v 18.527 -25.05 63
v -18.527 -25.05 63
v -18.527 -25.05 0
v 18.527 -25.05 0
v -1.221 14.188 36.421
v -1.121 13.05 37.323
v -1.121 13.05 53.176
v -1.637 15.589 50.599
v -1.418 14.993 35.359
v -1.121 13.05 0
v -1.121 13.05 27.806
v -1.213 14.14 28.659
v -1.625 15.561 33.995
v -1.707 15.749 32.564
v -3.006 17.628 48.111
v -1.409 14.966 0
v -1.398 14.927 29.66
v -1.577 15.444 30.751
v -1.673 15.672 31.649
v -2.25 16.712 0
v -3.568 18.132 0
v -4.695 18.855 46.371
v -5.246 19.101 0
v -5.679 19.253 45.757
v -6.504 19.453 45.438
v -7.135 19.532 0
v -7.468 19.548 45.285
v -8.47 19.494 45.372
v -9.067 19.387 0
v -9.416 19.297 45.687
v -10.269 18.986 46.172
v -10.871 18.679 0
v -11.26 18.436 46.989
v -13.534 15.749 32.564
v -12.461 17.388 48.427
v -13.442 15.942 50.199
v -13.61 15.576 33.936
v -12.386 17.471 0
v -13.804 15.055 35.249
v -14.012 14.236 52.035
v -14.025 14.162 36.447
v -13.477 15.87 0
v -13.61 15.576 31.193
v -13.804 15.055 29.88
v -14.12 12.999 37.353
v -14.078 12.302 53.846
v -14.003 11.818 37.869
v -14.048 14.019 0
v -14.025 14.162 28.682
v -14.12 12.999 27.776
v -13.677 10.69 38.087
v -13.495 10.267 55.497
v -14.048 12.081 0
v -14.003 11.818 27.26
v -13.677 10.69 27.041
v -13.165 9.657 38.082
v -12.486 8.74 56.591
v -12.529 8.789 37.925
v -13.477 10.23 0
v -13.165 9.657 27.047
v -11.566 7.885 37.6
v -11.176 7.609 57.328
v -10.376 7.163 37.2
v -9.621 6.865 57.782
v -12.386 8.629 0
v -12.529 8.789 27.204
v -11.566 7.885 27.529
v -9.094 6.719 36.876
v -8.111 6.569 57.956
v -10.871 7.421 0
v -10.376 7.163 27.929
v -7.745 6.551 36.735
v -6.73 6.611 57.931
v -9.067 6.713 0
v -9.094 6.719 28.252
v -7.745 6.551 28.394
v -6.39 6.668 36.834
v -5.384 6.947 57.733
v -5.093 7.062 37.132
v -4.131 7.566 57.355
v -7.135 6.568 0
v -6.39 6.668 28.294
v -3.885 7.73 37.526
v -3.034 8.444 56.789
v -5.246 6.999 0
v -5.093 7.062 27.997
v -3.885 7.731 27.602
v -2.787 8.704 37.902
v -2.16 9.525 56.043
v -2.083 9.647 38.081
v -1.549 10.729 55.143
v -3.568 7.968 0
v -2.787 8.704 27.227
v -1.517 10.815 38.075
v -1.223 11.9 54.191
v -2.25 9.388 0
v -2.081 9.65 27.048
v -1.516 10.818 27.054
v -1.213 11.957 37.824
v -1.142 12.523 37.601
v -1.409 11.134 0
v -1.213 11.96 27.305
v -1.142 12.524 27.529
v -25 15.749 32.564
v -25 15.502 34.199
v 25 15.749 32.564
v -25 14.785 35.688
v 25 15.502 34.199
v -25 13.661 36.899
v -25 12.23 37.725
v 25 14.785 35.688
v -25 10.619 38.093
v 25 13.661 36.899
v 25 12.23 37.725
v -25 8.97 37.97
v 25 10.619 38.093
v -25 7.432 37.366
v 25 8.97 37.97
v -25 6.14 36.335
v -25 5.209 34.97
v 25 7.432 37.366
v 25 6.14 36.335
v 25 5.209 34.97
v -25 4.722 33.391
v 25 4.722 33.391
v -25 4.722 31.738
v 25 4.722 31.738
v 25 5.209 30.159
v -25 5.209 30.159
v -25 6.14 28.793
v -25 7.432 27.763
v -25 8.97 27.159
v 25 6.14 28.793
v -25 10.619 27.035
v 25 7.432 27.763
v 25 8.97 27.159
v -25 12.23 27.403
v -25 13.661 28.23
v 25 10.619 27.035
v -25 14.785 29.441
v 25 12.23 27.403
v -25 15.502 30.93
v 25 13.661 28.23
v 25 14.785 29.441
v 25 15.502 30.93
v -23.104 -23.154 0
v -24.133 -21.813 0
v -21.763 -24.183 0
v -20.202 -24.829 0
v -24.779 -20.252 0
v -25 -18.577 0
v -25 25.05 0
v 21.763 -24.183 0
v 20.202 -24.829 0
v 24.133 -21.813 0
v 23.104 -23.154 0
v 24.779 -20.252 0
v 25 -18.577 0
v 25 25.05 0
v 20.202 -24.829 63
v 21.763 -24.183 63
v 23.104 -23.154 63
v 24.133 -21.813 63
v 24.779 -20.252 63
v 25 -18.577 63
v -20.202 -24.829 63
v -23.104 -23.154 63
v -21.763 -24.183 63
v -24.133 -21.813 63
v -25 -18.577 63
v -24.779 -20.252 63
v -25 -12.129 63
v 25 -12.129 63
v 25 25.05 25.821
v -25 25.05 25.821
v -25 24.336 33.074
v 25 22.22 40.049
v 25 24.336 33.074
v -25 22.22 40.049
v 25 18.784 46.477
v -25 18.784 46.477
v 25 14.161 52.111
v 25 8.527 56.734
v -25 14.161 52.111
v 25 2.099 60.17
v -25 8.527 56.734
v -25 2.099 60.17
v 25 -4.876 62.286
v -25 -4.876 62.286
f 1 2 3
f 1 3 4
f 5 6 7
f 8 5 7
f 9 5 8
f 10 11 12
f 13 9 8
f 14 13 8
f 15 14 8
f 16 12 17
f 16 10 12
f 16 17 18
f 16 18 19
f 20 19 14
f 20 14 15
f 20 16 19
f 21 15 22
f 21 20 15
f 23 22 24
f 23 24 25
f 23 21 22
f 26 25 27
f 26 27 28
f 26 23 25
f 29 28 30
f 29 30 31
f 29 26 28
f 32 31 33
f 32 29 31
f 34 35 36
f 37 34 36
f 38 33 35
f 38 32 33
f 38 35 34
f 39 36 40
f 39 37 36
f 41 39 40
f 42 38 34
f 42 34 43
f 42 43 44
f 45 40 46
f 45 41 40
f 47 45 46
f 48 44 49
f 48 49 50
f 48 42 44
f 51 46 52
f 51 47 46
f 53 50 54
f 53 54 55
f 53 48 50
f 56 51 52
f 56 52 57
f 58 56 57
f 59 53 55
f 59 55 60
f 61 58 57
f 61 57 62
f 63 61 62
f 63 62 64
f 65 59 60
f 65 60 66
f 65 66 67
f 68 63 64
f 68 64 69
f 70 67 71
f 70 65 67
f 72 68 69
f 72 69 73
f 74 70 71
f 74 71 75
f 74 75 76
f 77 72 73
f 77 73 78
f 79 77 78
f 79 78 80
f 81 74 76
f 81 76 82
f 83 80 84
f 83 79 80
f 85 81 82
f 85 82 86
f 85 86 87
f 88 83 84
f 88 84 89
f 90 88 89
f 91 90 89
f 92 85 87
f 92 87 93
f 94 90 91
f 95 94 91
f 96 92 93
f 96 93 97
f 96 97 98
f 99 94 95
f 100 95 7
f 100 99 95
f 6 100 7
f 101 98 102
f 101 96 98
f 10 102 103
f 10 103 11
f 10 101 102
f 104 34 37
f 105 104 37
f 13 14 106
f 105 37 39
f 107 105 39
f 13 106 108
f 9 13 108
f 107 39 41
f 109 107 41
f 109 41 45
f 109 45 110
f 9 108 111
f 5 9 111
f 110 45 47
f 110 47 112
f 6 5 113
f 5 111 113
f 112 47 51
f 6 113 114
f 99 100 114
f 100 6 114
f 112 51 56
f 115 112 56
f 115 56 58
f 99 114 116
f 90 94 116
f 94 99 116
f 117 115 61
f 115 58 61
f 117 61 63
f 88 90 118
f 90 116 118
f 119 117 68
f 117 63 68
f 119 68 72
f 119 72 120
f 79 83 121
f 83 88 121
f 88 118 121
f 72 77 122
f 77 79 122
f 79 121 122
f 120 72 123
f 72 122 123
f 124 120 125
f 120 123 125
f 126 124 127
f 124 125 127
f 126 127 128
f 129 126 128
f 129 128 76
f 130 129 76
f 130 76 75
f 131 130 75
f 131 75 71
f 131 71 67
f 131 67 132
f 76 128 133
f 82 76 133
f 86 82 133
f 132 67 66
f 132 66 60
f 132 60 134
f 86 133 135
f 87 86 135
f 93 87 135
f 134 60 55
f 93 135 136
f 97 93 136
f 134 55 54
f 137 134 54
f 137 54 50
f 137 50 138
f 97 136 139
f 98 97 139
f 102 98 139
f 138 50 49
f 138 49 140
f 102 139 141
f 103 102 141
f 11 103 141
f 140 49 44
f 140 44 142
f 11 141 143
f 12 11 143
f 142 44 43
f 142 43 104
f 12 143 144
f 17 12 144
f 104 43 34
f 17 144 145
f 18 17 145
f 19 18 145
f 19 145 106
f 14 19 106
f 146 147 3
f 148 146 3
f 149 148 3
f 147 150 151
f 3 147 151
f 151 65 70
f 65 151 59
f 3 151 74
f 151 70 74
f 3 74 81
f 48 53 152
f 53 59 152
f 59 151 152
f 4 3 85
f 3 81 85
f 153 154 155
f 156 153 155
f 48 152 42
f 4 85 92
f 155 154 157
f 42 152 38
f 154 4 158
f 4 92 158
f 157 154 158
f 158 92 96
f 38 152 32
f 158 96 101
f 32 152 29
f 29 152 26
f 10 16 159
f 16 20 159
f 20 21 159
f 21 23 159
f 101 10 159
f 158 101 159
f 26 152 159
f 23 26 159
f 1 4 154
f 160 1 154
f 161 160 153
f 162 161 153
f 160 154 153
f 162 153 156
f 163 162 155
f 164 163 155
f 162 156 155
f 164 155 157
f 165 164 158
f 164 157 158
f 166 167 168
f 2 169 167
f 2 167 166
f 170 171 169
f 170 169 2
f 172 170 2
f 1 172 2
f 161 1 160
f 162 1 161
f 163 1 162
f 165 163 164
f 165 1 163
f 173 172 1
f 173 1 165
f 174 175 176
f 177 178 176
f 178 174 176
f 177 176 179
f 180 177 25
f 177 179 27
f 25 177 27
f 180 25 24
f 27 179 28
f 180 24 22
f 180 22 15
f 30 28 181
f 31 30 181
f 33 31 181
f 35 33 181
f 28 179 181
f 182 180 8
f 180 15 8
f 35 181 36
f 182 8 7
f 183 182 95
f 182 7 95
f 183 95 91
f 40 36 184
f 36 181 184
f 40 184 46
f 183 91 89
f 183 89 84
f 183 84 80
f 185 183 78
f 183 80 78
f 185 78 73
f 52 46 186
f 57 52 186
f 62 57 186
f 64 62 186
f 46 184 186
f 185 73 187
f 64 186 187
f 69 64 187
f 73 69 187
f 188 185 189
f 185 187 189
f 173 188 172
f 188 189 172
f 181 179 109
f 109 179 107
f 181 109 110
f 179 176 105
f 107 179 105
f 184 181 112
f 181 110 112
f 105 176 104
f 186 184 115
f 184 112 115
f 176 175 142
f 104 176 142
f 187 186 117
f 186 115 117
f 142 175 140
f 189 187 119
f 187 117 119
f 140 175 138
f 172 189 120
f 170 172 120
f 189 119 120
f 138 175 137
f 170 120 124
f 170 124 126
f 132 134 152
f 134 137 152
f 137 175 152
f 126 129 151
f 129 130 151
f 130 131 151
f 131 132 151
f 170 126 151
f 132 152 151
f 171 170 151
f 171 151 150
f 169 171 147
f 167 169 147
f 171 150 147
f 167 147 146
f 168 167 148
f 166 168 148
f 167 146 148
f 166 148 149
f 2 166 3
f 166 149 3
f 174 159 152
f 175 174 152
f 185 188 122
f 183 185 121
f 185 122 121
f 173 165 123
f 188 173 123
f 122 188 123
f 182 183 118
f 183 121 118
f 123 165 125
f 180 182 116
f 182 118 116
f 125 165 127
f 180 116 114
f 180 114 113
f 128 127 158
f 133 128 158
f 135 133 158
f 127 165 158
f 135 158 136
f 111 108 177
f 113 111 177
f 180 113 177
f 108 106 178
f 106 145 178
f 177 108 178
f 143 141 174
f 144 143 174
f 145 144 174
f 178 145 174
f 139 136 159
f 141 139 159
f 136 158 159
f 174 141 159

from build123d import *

# Parameters (mm, degrees)
F0_R        = 6.5
F1_DEPTH    = 63
F2_T1_DEPTH = 235.8944443027
F3_R        = 5.5443537003
F4_DEPTH    = 50.0010001


# Not quite as in the source:
# - a fillet or chamfer that OpenCascade refuses, or shapes differently, is made with other operations: its cross-section is extruded or revolved along the edge and cut away or added


with BuildPart() as f1:
    # F0 (on Top) → F1 (new body)
    with BuildSketch(Plane.XY):
        with BuildLine():
            ThreePointArc((-25, -18.57671062), (-23.1040174372, -23.1540174372), (-18.52671062, -25.05))
            Line((-18.52671062, -25.05), (18.52671062, -25.05))
            ThreePointArc((18.52671062, -25.05), (23.1040174372, -23.1540174372), (25, -18.57671062))
            Line((25, -18.57671062), (25, 25.05))
            Line((25, 25.05), (-25, 25.05))
            Line((-25, 25.05), (-25, -18.57671062))
        make_face()
        with Locations((-7.6206641026, 13.05)):
            Circle(F0_R, mode=Mode.SUBTRACT)
    extrude(amount=F1_DEPTH)

    # F2: fillet of radius 37.1788888605 on 1 edges, made by hand

    # F2_s2 → F2_t1 (cut)
    with BuildSketch(Plane.YZ.offset(-117.9472221514)):
        with BuildLine():
            ThreePointArc((25.05, 25.8211111395), (14.1605555697, 52.1105555697), (-12.1288888605, 63))
            Line((-12.1288888605, 63), (25.05, 63))
            Line((25.05, 63), (25.05, 25.8211111395))
        make_face()
    extrude(amount=F2_T1_DEPTH, mode=Mode.SUBTRACT)

    # F3 (on face) → F4 (cut, through all)
    with BuildSketch(Plane.YZ.offset(25)):
        with Locations((10.2042127401, 32.5643420219)):
            Circle(F3_R)
    extrude(amount=-F4_DEPTH, mode=Mode.SUBTRACT)


solid = f1.part
